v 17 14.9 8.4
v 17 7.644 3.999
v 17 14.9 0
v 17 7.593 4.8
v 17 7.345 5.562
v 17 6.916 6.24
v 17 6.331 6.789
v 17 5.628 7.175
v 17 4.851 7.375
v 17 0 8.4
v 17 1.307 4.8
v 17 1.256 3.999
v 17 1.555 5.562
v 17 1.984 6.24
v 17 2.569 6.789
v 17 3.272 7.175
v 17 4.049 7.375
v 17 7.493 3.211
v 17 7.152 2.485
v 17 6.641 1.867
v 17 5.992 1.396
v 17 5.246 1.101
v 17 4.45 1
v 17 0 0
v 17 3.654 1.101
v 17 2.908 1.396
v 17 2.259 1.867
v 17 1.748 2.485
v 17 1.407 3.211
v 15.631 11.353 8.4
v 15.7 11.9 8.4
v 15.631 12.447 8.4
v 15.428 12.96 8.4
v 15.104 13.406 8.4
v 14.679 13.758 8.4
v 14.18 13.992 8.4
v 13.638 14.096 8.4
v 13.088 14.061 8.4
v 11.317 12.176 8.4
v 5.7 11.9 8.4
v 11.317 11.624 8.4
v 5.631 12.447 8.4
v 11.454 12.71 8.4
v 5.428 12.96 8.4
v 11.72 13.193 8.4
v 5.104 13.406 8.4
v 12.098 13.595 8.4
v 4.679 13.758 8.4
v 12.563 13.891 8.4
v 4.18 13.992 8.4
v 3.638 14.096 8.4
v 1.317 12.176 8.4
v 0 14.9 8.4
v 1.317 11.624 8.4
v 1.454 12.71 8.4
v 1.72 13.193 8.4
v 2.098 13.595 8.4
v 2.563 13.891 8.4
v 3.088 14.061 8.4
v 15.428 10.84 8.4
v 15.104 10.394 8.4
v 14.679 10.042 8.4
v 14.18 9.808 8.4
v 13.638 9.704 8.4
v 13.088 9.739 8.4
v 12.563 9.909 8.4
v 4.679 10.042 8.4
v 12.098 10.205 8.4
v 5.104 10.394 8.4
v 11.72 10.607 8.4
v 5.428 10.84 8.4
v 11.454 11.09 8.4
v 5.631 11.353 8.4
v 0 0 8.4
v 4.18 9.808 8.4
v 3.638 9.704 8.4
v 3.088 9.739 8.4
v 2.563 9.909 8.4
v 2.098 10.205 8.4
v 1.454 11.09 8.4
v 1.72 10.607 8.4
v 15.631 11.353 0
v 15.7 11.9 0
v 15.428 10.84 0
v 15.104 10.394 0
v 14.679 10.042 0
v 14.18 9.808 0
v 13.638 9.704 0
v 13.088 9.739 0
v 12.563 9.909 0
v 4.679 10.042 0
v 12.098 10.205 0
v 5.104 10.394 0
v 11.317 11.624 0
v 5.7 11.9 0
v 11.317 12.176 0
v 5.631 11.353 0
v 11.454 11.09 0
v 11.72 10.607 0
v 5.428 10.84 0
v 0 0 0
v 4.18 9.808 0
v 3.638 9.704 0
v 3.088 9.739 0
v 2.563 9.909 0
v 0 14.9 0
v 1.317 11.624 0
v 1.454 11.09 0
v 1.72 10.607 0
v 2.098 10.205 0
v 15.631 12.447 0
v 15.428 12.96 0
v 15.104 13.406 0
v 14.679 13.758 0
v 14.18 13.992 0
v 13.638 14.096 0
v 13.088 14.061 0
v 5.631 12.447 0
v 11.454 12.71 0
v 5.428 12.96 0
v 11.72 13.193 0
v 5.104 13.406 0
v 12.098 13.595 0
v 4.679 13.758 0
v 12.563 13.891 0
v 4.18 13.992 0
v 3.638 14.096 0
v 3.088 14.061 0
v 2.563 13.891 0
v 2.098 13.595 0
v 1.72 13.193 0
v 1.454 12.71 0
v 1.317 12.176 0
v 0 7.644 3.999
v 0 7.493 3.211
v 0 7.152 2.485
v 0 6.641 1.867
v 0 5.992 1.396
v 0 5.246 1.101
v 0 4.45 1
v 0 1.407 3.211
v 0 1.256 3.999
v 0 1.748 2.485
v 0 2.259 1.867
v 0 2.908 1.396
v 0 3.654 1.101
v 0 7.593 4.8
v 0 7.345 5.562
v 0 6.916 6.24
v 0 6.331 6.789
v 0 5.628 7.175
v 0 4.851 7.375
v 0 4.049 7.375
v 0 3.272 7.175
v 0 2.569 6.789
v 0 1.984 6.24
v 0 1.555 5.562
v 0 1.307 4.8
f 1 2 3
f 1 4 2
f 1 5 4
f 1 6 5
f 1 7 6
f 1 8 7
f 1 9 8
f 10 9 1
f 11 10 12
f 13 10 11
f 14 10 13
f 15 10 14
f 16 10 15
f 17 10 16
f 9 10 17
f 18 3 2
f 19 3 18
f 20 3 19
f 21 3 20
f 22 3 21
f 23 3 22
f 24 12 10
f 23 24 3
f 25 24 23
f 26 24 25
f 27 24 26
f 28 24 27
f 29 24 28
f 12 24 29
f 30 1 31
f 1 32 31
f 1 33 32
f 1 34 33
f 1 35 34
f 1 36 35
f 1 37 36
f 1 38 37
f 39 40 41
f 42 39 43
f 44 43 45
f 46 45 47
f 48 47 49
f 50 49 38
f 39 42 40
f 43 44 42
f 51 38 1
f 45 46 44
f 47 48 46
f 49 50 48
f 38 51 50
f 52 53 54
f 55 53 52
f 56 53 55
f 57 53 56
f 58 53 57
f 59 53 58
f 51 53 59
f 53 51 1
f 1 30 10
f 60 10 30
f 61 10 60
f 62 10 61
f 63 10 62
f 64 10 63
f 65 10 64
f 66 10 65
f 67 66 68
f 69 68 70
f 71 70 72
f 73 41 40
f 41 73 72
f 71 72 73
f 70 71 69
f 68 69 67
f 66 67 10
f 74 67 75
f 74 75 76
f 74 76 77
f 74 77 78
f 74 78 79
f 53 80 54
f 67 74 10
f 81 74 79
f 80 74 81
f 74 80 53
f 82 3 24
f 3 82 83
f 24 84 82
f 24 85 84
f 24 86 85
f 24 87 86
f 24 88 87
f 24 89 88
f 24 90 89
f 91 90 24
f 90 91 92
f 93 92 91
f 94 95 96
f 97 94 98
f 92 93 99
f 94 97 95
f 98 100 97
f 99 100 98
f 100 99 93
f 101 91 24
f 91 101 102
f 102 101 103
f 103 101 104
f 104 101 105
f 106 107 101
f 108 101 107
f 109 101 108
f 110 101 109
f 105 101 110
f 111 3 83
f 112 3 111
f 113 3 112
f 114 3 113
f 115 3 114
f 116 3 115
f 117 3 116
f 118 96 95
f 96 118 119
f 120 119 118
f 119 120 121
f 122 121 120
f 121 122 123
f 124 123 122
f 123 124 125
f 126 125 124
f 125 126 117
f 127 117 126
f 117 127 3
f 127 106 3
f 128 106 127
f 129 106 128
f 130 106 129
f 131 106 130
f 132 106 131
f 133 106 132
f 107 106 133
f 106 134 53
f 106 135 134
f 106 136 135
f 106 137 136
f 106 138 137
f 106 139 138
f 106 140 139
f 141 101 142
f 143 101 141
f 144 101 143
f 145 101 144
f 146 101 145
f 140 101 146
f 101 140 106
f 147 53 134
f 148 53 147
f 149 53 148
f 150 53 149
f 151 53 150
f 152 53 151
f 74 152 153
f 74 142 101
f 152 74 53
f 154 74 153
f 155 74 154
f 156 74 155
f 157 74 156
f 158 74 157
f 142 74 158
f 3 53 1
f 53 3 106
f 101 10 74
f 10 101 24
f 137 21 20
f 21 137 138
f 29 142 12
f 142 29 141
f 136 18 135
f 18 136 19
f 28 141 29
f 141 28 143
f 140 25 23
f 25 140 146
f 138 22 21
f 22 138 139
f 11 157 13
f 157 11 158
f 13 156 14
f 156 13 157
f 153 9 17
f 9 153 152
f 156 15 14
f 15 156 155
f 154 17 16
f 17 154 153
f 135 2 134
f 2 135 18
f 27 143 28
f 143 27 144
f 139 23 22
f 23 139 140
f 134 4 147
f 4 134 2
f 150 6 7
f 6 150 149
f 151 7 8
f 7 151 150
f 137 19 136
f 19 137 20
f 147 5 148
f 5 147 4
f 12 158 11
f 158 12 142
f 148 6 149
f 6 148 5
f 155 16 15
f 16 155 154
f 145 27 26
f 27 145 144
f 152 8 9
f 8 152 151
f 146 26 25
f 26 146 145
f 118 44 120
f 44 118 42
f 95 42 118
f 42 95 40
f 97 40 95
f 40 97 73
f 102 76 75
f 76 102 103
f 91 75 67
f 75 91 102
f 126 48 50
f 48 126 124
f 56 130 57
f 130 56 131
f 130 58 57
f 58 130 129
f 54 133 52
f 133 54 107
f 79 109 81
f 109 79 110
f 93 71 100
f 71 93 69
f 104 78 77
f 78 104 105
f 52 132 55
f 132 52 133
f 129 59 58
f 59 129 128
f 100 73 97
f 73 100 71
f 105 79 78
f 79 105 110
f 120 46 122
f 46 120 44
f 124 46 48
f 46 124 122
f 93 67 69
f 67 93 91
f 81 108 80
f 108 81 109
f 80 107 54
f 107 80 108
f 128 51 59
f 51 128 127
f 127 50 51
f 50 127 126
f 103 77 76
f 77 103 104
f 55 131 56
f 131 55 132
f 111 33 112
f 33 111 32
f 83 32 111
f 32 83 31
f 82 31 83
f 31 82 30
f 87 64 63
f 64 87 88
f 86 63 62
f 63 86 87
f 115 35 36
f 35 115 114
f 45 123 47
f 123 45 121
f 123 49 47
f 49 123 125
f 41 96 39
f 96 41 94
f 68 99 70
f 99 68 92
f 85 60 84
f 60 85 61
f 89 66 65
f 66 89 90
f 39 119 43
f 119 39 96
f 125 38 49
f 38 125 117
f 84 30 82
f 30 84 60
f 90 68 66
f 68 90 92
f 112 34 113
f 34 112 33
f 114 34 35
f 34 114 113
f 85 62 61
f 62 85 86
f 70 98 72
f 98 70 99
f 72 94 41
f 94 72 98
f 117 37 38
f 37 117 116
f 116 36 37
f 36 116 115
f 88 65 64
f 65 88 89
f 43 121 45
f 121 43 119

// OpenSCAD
// long nut 2 aside holding

// include <atu_supports.scad>
// include <atu_nut_axis.scad>

d_1  = 6.4;
r_1  = d_1 / 2;
r_h  = 4.0 / 2 + 0.2;

x_n  = 15.0; // nut length
x_a  = x_n + 2.0;

y_w  = 2.0;
y_x  = 0.5;
y_m  = y_w + d_1 + y_x;
y_a  = y_m + 6.0;
y_c  = y_m / 2;

z_w  = 2.0;
z_a  = z_w + d_1;
z_c  = z_a / 2;




$fn=25;


module nut4x15_side()
{
  difference() {
    cube( [x_a,y_a,z_a] );
    translate([ 0,y_c,z_c]) rotate([0,90,0]) cylinder( r=r_1, h=x_a );
    translate([  3.5,y_m+1.5*y_w,0])  cylinder( r=r_h, h=z_a );
    translate([ 13.5,y_m+1.5*y_w,0])  cylinder( r=r_h, h=z_a );

  }
}

 nut4x15_side();
//rotate([0,180,0]) nut4x15_side();
